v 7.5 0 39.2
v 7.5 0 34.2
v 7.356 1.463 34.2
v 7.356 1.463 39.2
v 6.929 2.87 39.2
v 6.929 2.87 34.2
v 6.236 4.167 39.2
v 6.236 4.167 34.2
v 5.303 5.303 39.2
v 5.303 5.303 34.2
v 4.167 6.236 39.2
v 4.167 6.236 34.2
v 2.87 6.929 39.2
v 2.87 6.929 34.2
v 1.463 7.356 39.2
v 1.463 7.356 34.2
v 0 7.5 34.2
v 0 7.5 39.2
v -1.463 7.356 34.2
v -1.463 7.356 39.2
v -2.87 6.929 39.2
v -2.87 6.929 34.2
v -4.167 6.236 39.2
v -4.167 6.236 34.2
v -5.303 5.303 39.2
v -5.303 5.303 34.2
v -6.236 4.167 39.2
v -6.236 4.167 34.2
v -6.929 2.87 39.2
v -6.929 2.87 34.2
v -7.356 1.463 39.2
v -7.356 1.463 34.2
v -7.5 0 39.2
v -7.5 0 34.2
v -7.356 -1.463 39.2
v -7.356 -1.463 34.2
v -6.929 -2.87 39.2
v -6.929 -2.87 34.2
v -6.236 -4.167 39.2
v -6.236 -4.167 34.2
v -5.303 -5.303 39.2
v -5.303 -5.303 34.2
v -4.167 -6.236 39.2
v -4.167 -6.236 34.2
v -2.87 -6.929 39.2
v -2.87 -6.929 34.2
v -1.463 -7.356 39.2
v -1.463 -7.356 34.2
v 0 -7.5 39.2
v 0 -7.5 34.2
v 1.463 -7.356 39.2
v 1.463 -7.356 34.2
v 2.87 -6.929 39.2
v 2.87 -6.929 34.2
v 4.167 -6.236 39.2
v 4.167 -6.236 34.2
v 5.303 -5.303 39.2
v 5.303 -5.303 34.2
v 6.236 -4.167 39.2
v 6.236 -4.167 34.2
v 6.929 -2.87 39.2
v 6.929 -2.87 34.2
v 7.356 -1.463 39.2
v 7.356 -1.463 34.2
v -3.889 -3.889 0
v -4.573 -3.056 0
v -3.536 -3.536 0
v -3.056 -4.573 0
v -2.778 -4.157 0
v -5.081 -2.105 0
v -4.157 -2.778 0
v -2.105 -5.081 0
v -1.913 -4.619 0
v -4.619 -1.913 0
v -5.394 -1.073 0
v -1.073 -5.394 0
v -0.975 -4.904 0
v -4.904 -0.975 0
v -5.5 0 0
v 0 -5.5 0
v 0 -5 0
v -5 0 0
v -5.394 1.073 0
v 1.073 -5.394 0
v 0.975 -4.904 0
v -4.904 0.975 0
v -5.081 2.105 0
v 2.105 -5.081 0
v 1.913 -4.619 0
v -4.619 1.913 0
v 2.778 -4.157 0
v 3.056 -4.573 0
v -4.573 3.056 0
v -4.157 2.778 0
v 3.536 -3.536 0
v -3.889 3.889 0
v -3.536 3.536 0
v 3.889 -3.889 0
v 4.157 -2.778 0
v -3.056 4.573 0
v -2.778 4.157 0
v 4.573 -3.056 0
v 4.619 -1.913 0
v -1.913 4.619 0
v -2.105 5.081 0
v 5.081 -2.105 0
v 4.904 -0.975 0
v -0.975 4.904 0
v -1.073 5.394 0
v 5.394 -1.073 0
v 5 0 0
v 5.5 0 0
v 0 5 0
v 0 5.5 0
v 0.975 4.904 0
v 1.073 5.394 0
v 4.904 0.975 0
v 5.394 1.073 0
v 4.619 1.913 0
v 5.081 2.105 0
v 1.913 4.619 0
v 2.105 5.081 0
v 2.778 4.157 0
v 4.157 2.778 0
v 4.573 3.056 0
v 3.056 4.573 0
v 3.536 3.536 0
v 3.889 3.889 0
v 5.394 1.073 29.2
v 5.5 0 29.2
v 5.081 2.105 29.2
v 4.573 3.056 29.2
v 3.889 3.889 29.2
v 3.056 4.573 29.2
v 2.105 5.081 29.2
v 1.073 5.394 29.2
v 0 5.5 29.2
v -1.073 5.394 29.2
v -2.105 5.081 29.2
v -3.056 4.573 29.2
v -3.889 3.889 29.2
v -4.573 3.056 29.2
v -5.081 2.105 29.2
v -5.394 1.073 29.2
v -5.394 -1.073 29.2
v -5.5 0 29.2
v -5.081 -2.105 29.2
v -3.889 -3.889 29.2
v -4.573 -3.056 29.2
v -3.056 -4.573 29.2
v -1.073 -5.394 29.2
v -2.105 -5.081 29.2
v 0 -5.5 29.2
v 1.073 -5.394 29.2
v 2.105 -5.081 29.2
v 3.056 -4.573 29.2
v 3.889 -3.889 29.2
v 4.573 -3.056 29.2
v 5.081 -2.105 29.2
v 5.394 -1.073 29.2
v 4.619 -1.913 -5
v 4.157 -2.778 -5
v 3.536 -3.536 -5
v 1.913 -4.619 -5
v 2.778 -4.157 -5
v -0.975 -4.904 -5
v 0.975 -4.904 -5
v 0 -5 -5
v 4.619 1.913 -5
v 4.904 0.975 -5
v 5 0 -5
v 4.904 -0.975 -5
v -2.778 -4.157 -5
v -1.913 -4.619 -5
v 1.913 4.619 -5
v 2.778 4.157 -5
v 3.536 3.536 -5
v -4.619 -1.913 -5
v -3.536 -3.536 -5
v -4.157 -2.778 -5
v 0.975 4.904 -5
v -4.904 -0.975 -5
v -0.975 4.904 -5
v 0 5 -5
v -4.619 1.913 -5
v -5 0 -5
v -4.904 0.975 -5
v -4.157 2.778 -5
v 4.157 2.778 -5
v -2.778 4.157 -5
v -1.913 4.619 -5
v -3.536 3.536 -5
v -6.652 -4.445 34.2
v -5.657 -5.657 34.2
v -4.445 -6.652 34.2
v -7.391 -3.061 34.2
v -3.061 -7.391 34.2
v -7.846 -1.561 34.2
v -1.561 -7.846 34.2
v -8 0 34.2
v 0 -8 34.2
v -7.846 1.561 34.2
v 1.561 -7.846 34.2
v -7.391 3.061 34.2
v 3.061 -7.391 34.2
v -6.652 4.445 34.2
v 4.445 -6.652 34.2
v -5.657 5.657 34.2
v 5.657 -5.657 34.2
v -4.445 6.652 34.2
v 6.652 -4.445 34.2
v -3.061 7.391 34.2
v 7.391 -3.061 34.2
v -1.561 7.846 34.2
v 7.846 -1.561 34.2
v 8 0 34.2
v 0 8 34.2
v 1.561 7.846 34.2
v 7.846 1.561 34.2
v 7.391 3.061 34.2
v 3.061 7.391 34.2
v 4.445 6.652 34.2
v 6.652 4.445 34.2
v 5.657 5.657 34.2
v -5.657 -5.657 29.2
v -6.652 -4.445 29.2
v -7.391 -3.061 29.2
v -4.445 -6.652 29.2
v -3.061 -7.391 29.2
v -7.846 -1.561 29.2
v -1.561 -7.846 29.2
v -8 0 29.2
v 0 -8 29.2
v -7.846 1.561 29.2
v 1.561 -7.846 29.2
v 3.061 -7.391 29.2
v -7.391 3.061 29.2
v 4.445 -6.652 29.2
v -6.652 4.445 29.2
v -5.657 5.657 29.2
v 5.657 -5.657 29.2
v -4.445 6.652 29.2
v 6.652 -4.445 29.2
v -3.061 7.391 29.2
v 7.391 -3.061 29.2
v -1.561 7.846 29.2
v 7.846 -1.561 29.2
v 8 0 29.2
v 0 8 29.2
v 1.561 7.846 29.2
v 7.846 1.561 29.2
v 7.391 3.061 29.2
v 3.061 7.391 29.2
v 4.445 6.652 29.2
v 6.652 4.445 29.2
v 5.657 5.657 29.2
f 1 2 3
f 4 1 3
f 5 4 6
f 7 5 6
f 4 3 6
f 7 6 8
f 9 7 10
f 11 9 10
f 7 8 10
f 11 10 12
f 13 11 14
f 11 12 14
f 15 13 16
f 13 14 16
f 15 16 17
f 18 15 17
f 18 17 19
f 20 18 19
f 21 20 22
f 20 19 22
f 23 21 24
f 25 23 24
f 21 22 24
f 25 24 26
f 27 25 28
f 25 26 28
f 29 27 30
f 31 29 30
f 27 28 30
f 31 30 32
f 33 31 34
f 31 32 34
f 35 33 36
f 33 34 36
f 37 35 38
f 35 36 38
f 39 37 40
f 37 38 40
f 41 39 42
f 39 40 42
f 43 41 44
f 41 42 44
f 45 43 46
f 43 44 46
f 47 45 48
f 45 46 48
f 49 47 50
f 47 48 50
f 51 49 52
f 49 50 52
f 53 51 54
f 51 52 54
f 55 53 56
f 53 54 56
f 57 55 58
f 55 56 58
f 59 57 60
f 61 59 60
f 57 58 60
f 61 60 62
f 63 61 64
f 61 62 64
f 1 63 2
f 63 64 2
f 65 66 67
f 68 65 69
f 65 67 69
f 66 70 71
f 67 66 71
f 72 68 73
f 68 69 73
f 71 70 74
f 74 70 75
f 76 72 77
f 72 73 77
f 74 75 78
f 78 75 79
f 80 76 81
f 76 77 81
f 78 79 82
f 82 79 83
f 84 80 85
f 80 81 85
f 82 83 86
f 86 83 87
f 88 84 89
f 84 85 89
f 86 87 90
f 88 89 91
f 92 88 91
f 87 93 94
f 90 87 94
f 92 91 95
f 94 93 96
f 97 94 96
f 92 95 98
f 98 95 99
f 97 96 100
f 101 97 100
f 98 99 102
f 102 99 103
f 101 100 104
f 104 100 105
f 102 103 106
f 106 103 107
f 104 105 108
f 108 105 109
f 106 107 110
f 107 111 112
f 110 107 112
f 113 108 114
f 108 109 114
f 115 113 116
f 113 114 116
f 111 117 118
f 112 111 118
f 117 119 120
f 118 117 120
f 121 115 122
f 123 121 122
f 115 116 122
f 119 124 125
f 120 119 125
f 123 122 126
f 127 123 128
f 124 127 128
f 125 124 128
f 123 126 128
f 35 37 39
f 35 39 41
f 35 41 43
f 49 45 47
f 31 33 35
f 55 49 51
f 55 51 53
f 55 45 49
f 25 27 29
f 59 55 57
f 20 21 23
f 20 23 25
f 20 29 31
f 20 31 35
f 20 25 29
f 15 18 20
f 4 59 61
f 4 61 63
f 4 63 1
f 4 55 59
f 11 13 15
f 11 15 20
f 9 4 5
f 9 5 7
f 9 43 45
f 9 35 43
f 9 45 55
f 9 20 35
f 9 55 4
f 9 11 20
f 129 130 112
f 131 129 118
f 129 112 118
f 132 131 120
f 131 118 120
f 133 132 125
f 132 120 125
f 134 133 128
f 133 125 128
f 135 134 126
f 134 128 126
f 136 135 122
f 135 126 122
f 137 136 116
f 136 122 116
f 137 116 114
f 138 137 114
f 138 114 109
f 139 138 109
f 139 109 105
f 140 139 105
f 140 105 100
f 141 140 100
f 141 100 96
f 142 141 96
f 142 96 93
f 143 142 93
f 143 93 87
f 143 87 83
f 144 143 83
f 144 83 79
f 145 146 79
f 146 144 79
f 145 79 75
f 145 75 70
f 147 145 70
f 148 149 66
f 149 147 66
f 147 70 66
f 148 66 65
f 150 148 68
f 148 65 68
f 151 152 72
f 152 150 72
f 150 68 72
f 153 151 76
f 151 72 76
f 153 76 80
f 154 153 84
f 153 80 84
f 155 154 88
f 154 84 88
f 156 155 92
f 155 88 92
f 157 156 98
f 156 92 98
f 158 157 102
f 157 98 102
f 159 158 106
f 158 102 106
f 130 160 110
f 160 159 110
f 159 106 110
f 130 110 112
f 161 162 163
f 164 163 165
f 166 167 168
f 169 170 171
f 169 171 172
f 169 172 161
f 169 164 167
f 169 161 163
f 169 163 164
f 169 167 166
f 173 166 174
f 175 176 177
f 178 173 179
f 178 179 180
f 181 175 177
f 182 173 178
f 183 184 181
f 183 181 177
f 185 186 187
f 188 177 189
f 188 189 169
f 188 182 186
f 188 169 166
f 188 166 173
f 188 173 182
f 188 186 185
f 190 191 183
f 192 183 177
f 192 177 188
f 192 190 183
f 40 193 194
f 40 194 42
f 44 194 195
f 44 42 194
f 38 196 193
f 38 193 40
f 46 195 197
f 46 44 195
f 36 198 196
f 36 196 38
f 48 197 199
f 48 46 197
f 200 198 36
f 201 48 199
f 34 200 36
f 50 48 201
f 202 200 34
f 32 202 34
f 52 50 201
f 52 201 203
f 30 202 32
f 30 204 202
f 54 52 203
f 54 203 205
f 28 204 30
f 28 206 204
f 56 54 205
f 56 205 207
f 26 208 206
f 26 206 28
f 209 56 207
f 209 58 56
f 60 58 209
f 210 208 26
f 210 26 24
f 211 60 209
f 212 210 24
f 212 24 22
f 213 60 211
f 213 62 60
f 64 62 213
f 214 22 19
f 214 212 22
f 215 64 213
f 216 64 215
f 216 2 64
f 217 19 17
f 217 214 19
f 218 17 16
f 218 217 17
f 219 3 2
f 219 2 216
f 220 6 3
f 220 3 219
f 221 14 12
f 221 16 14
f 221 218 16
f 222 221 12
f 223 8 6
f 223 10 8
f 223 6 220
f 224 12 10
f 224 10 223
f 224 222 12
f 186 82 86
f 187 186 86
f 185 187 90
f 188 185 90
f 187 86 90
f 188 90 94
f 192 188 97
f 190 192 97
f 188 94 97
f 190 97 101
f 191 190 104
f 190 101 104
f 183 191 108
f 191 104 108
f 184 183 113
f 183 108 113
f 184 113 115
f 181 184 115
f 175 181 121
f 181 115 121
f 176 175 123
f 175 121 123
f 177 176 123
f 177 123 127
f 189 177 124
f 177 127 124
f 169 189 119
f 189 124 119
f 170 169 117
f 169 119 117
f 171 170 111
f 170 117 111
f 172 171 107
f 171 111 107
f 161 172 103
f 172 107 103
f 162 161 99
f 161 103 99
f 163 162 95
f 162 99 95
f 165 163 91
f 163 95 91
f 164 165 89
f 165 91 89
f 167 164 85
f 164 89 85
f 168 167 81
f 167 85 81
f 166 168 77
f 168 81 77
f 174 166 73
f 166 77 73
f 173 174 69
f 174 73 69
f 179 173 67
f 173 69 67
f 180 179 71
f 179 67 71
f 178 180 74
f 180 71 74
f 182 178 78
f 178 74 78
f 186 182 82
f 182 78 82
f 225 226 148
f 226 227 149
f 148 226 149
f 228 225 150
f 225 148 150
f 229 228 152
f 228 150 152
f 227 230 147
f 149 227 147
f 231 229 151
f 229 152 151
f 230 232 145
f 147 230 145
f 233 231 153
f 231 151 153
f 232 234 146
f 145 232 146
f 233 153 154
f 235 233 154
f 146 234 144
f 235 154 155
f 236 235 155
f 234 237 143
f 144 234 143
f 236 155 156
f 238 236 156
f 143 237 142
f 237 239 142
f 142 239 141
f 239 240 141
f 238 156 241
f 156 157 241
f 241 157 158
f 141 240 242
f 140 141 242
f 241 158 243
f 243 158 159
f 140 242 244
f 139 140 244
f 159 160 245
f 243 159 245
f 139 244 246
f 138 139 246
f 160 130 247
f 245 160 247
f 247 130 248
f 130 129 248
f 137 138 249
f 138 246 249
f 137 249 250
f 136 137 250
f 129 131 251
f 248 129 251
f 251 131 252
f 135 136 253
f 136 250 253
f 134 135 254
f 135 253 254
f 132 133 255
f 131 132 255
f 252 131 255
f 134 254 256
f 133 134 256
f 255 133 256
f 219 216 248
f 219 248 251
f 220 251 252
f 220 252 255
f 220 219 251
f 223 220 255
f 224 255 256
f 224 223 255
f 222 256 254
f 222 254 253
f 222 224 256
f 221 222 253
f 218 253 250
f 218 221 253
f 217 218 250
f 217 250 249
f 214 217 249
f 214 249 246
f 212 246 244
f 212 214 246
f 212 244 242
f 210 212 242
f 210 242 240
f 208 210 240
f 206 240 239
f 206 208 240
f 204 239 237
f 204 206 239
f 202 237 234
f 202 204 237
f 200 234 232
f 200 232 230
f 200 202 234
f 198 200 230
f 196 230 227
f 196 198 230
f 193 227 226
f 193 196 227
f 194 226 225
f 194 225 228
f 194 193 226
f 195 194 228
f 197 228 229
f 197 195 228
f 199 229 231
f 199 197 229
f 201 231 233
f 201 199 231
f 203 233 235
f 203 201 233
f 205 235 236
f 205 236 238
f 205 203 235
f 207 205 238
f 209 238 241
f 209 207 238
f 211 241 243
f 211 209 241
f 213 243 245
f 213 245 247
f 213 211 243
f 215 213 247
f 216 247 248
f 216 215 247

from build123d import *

# Parameters (mm, degrees)
SKETCH_1_R      = 5.5
EXTRUDE_1_DEPTH = 34.2
SKETCH_2_R      = 8
EXTRUDE_2_DEPTH = 5
SKETCH_3_R      = 7.5
EXTRUDE_3_DEPTH = 5
SKETCH_5_R      = 5
EXTRUDE_4_DEPTH = 5


with BuildPart() as part:
    # ｽｹｯﾁ1 → ﾎﾞｽ - 押し出し1 (new body)
    with BuildSketch(Plane.XY):
        Circle(SKETCH_1_R)
    extrude(amount=EXTRUDE_1_DEPTH)

    # ｽｹｯﾁ2 → ﾎﾞｽ - 押し出し2 (add)
    with BuildSketch(Plane.XY.offset(34.2)):
        Circle(SKETCH_2_R)
    extrude(amount=-EXTRUDE_2_DEPTH)

    # ｽｹｯﾁ3 → ﾎﾞｽ - 押し出し3 (add)
    with BuildSketch(Plane.XY.offset(34.2)):
        Circle(SKETCH_3_R)
    extrude(amount=EXTRUDE_3_DEPTH)

    # ｽｹｯﾁ5 → ﾎﾞｽ - 押し出し4 (add)
    with BuildSketch(Plane(origin=(0, 0, 0), x_dir=(-1, 0, 0), z_dir=(0, 0, -1))):
        Circle(SKETCH_5_R)
    extrude(amount=EXTRUDE_4_DEPTH)


solid = part.part
